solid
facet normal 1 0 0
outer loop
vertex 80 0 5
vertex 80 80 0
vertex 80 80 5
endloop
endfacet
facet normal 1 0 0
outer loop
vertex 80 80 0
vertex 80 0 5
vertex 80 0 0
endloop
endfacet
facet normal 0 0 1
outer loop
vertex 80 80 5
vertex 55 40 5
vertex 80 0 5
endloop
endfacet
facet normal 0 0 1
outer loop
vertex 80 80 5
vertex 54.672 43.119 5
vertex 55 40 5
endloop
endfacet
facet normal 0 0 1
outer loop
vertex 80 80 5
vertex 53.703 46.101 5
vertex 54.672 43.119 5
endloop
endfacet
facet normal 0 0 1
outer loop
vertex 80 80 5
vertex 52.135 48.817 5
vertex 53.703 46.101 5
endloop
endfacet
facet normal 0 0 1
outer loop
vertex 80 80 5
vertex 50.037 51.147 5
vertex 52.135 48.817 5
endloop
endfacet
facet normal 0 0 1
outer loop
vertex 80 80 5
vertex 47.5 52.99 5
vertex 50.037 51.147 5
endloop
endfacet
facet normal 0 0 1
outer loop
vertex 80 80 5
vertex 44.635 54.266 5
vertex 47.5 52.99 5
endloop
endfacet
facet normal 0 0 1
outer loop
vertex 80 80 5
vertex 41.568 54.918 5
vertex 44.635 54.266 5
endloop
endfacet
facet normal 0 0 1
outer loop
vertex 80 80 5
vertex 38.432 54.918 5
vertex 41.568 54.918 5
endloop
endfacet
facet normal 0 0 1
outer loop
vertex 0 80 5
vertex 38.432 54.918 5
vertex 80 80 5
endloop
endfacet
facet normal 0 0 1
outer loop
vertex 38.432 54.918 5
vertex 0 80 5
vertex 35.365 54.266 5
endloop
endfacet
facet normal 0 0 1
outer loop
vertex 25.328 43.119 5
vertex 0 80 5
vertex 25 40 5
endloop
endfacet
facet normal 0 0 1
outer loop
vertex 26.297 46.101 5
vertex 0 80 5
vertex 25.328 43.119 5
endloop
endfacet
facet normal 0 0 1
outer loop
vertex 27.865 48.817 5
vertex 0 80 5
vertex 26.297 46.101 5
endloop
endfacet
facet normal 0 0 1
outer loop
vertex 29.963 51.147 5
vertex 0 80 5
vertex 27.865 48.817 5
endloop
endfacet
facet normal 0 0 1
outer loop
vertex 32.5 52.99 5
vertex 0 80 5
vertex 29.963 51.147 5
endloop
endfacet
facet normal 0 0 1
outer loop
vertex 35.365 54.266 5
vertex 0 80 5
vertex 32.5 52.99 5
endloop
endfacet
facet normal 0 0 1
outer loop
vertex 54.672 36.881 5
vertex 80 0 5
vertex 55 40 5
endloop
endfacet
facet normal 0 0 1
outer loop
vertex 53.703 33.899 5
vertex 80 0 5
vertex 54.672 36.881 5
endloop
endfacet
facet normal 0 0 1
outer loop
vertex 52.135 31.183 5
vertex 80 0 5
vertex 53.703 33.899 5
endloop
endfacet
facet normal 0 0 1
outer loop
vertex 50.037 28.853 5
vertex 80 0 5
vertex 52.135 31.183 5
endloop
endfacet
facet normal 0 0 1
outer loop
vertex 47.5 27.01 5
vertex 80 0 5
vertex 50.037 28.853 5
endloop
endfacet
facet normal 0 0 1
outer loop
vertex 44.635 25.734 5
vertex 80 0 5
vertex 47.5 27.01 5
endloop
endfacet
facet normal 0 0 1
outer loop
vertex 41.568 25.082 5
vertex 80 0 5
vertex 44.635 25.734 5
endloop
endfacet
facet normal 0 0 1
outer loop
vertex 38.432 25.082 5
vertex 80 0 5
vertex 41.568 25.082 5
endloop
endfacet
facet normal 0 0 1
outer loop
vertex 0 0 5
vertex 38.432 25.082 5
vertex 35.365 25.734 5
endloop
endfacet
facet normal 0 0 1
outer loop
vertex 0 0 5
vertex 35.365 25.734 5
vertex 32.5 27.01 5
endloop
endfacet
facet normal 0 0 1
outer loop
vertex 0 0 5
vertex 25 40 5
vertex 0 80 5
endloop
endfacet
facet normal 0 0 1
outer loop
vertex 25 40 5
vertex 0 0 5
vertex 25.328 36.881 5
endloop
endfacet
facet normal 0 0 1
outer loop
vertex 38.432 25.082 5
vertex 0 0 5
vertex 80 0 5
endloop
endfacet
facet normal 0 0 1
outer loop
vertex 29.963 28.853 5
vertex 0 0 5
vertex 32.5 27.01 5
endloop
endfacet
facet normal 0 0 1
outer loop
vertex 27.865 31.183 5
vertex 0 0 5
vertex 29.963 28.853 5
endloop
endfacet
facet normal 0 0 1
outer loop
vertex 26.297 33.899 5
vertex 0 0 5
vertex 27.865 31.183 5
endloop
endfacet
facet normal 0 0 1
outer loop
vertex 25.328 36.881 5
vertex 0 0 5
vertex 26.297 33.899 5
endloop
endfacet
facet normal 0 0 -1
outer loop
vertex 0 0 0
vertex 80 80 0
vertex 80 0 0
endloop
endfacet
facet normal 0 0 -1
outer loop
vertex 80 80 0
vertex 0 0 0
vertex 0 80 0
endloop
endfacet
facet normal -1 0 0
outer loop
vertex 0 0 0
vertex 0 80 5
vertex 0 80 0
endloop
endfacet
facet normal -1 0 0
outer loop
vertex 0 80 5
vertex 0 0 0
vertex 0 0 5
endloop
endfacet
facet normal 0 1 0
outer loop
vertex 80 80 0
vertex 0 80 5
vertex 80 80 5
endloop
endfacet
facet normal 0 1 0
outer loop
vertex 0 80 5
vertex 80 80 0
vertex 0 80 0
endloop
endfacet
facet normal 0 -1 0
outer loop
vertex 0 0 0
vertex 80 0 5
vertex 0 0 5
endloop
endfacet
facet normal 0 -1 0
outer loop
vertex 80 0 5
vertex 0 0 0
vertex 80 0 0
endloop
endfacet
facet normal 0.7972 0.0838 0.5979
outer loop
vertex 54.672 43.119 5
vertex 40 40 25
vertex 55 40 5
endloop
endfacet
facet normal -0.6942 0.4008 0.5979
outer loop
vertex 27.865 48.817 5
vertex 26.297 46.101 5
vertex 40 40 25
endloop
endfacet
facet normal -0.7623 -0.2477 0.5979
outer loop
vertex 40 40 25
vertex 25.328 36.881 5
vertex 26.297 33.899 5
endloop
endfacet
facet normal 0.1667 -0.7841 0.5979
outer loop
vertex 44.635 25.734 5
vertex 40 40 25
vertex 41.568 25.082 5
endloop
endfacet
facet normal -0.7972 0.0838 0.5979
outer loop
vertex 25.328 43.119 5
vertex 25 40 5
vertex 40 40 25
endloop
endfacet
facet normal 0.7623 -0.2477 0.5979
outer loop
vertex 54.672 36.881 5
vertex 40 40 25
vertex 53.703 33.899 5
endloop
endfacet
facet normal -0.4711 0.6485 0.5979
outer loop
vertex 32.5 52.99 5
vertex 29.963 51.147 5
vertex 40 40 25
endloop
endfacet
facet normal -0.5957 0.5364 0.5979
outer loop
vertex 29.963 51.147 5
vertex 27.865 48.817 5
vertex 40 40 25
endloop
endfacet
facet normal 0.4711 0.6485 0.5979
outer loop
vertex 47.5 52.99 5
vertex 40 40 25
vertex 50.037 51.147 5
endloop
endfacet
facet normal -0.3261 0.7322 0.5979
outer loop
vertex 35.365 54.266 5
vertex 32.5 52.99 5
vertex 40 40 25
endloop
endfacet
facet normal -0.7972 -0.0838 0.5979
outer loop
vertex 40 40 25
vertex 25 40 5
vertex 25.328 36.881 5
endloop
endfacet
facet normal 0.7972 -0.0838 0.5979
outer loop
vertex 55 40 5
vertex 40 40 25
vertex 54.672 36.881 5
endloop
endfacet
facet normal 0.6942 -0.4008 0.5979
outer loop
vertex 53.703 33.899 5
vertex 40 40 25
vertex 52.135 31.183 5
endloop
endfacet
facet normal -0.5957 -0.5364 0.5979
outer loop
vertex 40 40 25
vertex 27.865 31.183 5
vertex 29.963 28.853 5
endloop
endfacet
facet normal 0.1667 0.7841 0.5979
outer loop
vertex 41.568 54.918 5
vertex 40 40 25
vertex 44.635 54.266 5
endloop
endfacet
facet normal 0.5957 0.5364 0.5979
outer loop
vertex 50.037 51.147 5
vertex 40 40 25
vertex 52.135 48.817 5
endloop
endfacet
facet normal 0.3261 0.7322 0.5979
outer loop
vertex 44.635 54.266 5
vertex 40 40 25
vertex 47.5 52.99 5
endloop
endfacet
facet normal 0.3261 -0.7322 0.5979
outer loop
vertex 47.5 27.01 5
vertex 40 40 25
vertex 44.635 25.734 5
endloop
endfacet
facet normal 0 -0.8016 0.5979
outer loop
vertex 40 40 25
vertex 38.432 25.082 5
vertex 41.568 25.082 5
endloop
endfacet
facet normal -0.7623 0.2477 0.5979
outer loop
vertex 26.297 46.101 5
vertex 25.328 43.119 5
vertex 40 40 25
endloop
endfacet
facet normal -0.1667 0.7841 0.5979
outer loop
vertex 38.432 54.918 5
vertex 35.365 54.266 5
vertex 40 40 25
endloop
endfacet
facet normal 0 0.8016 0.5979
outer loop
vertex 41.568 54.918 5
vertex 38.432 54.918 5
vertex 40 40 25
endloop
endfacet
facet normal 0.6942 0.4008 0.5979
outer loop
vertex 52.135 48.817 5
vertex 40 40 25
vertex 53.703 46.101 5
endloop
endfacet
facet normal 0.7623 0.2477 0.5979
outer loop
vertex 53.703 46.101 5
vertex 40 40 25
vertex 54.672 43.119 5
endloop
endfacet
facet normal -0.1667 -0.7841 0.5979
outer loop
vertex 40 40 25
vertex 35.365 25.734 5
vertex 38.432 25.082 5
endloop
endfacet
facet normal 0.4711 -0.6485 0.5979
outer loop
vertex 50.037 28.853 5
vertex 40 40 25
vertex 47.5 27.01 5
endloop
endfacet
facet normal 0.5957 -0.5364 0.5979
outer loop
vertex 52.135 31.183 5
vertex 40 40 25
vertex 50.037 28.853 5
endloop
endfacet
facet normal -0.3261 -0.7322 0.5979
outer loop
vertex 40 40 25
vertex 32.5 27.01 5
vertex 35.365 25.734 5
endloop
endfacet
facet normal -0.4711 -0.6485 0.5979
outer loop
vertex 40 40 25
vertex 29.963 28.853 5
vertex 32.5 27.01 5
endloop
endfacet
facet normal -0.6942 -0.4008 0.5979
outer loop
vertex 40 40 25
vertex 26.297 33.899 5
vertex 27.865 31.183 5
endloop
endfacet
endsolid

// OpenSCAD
// Generated by SolidPython 1.1.3 on 2025-04-27 23:32:39


union() {
	color(alpha = 1.0000000000, c = "blue") {
		cube(size = [80, 80, 5]);
	}
	translate(v = [40, 40, 5]) {
		cylinder(h = 20, r1 = 15, r2 = 0);
	}
}
/***********************************************
*********      SolidPython code:      **********
************************************************
 
from solid import *
from solid.utils import *

def create_ocean_plate(size=80, thickness=5):
    """Créer une plaque représentant l'océan."""
    return color("blue")(cube([size, size, thickness]))

def create_island(center_x, center_y, base_radius=10, height=15):
    """Créer une île à un endroit donné."""
    return translate([center_x, center_y, 5])(cylinder(r1=base_radius, r2=0, h=height))

def generate_scene():
    ocean = create_ocean_plate()
    island = create_island(40, 40, base_radius=15, height=20)  # Une île au centre

    return union()(ocean, island)

if __name__ == '__main__':
    scad_render_to_file(generate_scene(), 'model.scad')
 
 
************************************************/
